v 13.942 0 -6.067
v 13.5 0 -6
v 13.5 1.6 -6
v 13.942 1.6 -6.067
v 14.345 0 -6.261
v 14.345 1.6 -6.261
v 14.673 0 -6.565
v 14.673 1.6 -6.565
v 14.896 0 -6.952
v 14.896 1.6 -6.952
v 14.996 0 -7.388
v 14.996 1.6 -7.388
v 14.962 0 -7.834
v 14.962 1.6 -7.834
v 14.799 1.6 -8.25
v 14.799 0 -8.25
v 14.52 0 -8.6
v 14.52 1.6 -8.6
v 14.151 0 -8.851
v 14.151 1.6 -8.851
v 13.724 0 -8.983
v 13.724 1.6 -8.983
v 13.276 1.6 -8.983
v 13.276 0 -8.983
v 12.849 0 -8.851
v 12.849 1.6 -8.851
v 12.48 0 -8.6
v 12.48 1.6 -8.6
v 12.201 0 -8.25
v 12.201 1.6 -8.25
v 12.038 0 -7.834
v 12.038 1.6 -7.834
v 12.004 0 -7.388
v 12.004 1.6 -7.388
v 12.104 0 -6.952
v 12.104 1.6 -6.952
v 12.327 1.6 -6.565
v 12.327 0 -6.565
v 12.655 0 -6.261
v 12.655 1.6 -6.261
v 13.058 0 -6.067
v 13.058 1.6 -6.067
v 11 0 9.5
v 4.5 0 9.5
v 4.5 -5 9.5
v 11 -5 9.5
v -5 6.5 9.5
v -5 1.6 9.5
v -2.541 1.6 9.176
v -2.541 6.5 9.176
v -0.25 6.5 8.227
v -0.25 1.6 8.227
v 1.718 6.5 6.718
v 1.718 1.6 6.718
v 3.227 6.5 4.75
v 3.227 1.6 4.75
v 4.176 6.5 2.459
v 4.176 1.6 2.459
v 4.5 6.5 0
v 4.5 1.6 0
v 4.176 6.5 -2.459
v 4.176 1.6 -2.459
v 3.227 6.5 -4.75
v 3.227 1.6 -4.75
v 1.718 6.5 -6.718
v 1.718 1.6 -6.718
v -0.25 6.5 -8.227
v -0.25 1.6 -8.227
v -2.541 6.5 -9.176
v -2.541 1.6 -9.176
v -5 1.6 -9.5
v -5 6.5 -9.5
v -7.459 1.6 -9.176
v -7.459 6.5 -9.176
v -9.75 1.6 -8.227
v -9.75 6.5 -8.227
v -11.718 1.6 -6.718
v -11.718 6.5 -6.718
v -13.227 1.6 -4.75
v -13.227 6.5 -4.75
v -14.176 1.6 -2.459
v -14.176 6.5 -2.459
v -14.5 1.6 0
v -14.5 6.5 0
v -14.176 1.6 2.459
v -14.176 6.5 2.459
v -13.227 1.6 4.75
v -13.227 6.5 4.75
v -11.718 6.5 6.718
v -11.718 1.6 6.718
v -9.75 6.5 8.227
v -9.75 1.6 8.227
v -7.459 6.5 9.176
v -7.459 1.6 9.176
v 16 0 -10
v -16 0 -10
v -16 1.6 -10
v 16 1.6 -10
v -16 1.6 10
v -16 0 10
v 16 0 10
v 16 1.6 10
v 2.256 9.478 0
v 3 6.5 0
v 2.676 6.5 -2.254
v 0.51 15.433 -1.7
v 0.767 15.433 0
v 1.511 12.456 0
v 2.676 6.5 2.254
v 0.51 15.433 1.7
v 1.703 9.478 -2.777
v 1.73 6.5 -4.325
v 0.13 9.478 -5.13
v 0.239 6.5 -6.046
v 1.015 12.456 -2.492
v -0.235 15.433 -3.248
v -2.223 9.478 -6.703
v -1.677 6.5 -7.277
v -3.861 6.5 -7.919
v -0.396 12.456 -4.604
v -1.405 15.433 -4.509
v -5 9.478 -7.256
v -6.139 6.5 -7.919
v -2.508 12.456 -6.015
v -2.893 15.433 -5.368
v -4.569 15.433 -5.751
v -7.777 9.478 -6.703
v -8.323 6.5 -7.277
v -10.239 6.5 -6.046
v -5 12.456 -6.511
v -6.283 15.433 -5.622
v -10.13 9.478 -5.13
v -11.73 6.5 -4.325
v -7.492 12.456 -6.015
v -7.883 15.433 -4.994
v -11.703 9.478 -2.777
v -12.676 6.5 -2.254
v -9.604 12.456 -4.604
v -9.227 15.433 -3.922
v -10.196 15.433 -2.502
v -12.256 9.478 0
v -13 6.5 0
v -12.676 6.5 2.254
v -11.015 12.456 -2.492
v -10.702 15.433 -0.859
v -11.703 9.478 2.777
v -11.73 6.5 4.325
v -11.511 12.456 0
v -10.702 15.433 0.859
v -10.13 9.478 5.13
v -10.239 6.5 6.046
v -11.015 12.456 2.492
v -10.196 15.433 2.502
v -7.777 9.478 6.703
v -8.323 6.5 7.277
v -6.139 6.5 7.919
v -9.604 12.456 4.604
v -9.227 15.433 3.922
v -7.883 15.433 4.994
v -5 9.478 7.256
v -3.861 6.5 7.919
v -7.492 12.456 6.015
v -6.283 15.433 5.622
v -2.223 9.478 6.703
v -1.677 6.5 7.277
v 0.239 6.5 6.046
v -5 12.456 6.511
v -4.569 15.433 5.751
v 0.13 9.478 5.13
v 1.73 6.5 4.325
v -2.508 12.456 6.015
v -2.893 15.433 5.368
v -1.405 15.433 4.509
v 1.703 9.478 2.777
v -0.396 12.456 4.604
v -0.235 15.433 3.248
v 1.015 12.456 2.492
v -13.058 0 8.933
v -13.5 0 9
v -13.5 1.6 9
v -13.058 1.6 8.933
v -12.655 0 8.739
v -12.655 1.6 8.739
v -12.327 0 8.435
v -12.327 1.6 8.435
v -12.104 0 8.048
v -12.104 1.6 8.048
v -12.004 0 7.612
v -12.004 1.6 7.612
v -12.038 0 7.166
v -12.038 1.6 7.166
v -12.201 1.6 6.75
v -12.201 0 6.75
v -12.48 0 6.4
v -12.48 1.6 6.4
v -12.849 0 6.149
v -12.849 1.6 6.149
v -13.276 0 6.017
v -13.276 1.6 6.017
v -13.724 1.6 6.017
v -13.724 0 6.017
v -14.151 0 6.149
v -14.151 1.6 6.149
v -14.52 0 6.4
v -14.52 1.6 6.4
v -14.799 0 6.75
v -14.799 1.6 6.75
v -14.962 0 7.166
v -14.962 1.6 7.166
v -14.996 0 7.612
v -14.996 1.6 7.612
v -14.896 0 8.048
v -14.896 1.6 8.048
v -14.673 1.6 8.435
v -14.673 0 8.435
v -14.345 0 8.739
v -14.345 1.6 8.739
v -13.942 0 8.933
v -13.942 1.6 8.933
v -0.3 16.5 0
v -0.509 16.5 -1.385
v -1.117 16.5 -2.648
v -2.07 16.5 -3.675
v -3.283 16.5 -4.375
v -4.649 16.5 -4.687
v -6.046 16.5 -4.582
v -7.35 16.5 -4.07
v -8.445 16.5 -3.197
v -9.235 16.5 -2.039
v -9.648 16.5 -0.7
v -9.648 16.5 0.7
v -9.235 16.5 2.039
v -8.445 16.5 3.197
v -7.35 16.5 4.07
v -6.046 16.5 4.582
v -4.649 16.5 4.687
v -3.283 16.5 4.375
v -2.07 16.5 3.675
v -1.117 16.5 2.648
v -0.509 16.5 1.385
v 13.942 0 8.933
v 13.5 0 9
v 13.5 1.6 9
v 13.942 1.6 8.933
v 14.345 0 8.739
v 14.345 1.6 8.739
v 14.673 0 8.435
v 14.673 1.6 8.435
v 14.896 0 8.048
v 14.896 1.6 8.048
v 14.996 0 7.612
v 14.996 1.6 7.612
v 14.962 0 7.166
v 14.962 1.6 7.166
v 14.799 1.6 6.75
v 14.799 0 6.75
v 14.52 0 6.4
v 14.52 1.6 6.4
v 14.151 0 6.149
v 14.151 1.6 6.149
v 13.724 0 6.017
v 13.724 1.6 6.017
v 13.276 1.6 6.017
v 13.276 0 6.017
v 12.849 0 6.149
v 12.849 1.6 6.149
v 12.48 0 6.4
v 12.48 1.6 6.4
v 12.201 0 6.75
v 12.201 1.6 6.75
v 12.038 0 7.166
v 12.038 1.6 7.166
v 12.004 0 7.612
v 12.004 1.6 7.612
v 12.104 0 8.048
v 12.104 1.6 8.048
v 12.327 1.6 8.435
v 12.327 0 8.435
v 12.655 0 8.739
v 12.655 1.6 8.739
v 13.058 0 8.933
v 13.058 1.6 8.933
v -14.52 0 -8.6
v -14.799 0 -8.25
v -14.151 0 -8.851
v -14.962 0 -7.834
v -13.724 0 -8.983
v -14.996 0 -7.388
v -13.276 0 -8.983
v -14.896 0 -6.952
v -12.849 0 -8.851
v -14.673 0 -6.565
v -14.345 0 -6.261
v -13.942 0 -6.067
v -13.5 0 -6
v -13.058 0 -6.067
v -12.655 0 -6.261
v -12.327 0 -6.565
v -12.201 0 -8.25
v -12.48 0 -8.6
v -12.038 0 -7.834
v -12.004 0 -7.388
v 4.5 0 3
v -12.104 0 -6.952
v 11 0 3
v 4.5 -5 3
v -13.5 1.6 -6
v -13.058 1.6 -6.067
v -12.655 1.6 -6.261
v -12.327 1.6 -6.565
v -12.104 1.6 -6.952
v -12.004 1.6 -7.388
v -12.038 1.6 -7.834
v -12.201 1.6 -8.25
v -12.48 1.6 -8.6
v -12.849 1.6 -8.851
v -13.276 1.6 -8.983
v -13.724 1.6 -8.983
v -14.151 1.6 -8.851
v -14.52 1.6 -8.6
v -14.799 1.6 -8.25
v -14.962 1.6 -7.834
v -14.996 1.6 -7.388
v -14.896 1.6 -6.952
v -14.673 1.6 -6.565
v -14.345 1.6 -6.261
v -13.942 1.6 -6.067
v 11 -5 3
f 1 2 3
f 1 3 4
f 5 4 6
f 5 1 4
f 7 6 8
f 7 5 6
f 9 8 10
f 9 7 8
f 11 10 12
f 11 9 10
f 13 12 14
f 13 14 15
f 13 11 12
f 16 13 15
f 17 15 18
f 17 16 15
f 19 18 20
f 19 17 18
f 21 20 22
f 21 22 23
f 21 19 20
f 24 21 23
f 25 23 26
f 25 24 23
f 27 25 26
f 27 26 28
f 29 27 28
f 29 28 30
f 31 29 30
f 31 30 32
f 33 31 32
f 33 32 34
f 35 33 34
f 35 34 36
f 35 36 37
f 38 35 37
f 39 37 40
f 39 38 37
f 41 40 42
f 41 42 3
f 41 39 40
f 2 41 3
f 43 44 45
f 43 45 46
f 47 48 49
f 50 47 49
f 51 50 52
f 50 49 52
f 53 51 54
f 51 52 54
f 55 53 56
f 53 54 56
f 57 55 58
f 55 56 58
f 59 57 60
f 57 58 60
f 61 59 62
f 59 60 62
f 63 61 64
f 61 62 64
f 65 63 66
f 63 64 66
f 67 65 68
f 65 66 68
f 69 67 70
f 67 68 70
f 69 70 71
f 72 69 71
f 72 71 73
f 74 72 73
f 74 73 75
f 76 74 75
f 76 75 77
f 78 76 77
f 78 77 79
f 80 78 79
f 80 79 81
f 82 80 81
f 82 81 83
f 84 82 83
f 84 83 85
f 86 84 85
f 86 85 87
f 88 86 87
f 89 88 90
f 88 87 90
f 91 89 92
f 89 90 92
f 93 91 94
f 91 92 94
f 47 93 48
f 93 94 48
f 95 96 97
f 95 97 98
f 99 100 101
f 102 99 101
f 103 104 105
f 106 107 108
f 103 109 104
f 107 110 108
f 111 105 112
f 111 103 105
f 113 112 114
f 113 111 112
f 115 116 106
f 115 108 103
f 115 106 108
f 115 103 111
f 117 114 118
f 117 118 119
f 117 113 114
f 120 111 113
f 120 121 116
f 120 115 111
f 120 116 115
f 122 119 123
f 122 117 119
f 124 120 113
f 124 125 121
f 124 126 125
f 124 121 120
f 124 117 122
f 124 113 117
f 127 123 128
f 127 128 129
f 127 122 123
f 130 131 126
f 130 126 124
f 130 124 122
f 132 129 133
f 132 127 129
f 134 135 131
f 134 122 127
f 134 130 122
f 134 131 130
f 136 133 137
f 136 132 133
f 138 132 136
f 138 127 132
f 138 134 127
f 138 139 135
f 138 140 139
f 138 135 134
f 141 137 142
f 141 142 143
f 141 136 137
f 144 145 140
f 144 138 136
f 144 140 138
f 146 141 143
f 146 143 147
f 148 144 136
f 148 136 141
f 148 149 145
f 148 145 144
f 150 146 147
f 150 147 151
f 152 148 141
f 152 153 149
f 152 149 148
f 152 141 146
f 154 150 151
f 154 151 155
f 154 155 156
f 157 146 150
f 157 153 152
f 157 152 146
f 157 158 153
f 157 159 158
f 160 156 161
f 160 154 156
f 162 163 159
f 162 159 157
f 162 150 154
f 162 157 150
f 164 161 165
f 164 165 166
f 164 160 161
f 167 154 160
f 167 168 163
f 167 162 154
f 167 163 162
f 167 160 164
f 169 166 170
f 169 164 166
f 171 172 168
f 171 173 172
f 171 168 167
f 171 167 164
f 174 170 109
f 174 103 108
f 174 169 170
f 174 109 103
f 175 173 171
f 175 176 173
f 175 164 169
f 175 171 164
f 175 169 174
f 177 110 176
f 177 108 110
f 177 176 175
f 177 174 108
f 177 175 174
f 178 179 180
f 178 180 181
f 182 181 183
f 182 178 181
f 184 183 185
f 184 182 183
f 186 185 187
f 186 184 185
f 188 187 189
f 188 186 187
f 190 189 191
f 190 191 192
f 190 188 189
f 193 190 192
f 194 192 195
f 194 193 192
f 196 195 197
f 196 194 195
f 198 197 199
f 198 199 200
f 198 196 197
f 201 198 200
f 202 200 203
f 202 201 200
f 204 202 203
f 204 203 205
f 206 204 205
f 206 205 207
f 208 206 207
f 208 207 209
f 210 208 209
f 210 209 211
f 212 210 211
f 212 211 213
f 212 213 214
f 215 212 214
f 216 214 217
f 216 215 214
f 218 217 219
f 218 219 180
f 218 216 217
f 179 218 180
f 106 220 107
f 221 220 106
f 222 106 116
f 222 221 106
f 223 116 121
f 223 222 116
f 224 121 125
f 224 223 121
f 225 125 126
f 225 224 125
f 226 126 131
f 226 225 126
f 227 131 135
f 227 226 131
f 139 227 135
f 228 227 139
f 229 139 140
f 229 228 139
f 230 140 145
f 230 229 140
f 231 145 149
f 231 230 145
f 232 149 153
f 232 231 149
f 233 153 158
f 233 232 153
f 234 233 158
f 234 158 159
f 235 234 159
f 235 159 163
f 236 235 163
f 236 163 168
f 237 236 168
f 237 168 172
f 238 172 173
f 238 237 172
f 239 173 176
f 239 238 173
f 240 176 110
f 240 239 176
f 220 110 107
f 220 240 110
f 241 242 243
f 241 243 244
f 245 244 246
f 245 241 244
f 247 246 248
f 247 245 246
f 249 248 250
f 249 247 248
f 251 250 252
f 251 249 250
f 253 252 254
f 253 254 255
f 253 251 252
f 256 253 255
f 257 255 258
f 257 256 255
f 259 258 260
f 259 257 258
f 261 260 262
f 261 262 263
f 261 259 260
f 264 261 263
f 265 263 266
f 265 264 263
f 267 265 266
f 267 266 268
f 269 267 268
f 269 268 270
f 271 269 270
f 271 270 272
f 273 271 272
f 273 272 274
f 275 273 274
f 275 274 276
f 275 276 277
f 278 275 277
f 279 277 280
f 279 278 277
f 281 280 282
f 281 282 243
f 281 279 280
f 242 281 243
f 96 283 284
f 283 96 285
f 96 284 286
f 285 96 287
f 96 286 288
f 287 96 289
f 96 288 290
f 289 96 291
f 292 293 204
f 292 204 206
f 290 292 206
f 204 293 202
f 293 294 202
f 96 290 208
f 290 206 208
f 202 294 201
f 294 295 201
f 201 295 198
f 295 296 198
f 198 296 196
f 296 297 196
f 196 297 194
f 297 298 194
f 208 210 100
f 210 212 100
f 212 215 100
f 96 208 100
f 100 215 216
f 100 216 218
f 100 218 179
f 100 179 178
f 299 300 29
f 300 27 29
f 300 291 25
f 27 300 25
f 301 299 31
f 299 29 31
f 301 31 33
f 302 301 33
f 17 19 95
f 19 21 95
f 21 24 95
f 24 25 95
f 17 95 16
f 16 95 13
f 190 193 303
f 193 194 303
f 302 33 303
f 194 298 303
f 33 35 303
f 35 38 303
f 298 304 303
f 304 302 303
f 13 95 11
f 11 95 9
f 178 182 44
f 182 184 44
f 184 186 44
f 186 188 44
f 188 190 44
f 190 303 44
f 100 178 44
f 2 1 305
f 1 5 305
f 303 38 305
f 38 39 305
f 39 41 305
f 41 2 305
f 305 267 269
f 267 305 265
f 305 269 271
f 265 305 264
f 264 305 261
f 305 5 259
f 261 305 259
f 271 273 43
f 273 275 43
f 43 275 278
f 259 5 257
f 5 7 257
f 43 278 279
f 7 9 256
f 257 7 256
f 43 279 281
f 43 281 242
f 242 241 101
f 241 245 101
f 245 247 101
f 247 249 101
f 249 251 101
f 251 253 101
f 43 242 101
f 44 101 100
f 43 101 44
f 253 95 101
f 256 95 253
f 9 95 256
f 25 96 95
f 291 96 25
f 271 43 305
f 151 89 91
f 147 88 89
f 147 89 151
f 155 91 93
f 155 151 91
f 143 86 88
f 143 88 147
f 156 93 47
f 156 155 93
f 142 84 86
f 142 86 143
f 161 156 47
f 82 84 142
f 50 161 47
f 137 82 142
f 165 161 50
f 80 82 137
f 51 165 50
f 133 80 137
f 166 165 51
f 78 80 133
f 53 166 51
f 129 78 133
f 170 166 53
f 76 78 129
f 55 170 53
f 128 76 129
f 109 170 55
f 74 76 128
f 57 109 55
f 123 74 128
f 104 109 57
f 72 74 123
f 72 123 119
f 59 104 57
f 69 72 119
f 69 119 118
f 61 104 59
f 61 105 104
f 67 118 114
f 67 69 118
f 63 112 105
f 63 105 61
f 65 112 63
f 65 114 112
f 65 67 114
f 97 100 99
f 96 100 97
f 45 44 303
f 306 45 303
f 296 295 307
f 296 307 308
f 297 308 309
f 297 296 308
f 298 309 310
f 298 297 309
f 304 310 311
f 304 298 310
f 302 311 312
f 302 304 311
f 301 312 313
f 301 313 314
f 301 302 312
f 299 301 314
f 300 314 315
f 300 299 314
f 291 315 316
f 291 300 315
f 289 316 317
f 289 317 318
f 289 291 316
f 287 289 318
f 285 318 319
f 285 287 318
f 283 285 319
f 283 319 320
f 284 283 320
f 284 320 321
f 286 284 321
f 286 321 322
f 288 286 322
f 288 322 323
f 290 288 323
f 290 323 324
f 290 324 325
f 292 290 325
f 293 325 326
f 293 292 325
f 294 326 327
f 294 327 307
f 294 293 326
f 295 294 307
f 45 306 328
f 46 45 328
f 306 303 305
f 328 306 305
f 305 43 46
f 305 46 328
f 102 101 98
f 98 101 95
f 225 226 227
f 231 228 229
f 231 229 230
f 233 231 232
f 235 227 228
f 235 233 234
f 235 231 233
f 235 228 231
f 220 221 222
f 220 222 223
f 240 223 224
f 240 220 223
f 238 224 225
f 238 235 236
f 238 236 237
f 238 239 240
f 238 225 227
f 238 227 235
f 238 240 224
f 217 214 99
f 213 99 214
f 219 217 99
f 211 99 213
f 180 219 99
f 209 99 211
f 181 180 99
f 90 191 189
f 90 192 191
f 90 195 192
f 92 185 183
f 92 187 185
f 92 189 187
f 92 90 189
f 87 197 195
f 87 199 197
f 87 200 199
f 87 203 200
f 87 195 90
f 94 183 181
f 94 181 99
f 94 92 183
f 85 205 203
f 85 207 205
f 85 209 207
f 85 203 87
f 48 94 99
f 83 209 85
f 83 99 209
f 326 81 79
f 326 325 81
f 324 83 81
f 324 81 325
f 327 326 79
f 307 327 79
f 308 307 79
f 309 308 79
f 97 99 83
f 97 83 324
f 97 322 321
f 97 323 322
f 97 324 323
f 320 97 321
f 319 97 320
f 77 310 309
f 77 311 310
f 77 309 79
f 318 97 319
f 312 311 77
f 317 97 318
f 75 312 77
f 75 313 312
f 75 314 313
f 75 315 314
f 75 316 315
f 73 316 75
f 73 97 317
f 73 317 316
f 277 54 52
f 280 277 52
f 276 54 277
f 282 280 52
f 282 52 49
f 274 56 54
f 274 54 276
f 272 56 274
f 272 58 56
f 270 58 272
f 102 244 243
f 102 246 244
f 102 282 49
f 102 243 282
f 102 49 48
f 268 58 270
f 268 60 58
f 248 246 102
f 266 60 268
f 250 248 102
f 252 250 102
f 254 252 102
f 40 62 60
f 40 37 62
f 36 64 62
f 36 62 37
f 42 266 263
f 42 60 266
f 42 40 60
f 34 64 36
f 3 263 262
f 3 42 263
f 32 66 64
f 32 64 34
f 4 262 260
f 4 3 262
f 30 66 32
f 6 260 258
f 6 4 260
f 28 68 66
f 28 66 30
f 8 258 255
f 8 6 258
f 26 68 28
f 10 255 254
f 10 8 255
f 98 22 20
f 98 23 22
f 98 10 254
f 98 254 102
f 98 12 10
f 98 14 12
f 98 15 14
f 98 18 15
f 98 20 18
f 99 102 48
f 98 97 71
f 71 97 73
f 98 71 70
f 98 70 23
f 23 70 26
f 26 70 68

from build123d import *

# Parameters (mm, degrees)
SKETCH_1_W      = 32
SKETCH_1_H      = 20
SKETCH_1_R      = 1.5
EXTRUDE_1_DEPTH = 1.6
SKETCH_2_W      = 6.5
SKETCH_2_H      = 6.5
EXTRUDE_2_DEPTH = 5
SKETCH_3_R      = 9.5
EXTRUDE_3_DEPTH = 16.5


with BuildPart() as part:
    # 草图1 → 凸台-拉伸1 (new body)
    with BuildSketch(Plane(origin=(0, 0, 0), x_dir=(1, 0, 0), z_dir=(0, 1, 0))):
        Rectangle(SKETCH_1_W, SKETCH_1_H)
        with Locations(Location((-13.5, 7.5, 0), (0, 0, 270))):
            Circle(SKETCH_1_R, mode=Mode.SUBTRACT)
        with Locations(Location((13.5, 7.5, 0), (0, 0, 270))):
            Circle(SKETCH_1_R, mode=Mode.SUBTRACT)
        with Locations(Location((-13.5, -7.5, 0), (0, 0, 270))):
            Circle(SKETCH_1_R, mode=Mode.SUBTRACT)
        with Locations(Location((13.5, -7.5, 0), (0, 0, 270))):
            Circle(SKETCH_1_R, mode=Mode.SUBTRACT)
    extrude(amount=EXTRUDE_1_DEPTH)

    # 草图2 → 凸台-拉伸2 (add)
    with BuildSketch(Plane(origin=(0, 0, 0), x_dir=(1, 0, 0), z_dir=(0, 1, 0))):
        with Locations((7.75, -6.25)):
            Rectangle(SKETCH_2_W, SKETCH_2_H)
    extrude(amount=-EXTRUDE_2_DEPTH)

    # 草图3 → 凸台-拉伸3 (add)
    with BuildSketch(Plane(origin=(0, 0, 0), x_dir=(1, 0, 0), z_dir=(0, 1, 0))):
        with Locations(Location((-5, 0, 0), (0, 0, 270))):
            Circle(SKETCH_3_R)
    extrude(amount=EXTRUDE_3_DEPTH)

    # 草图4 → 切除-旋转2 (revolve, cut)
    with BuildSketch(Plane.XY):
        Polygon((-0.3, 16.5), (0.5, 16.5), (4.5, 16.5), (4.5, 6.5), (3, 6.5), (0.766666667, 15.433333333), align=None)
    revolve(axis=Axis((-5, -983.5, 0), (0, 1, 0)), mode=Mode.SUBTRACT)


solid = part.part
